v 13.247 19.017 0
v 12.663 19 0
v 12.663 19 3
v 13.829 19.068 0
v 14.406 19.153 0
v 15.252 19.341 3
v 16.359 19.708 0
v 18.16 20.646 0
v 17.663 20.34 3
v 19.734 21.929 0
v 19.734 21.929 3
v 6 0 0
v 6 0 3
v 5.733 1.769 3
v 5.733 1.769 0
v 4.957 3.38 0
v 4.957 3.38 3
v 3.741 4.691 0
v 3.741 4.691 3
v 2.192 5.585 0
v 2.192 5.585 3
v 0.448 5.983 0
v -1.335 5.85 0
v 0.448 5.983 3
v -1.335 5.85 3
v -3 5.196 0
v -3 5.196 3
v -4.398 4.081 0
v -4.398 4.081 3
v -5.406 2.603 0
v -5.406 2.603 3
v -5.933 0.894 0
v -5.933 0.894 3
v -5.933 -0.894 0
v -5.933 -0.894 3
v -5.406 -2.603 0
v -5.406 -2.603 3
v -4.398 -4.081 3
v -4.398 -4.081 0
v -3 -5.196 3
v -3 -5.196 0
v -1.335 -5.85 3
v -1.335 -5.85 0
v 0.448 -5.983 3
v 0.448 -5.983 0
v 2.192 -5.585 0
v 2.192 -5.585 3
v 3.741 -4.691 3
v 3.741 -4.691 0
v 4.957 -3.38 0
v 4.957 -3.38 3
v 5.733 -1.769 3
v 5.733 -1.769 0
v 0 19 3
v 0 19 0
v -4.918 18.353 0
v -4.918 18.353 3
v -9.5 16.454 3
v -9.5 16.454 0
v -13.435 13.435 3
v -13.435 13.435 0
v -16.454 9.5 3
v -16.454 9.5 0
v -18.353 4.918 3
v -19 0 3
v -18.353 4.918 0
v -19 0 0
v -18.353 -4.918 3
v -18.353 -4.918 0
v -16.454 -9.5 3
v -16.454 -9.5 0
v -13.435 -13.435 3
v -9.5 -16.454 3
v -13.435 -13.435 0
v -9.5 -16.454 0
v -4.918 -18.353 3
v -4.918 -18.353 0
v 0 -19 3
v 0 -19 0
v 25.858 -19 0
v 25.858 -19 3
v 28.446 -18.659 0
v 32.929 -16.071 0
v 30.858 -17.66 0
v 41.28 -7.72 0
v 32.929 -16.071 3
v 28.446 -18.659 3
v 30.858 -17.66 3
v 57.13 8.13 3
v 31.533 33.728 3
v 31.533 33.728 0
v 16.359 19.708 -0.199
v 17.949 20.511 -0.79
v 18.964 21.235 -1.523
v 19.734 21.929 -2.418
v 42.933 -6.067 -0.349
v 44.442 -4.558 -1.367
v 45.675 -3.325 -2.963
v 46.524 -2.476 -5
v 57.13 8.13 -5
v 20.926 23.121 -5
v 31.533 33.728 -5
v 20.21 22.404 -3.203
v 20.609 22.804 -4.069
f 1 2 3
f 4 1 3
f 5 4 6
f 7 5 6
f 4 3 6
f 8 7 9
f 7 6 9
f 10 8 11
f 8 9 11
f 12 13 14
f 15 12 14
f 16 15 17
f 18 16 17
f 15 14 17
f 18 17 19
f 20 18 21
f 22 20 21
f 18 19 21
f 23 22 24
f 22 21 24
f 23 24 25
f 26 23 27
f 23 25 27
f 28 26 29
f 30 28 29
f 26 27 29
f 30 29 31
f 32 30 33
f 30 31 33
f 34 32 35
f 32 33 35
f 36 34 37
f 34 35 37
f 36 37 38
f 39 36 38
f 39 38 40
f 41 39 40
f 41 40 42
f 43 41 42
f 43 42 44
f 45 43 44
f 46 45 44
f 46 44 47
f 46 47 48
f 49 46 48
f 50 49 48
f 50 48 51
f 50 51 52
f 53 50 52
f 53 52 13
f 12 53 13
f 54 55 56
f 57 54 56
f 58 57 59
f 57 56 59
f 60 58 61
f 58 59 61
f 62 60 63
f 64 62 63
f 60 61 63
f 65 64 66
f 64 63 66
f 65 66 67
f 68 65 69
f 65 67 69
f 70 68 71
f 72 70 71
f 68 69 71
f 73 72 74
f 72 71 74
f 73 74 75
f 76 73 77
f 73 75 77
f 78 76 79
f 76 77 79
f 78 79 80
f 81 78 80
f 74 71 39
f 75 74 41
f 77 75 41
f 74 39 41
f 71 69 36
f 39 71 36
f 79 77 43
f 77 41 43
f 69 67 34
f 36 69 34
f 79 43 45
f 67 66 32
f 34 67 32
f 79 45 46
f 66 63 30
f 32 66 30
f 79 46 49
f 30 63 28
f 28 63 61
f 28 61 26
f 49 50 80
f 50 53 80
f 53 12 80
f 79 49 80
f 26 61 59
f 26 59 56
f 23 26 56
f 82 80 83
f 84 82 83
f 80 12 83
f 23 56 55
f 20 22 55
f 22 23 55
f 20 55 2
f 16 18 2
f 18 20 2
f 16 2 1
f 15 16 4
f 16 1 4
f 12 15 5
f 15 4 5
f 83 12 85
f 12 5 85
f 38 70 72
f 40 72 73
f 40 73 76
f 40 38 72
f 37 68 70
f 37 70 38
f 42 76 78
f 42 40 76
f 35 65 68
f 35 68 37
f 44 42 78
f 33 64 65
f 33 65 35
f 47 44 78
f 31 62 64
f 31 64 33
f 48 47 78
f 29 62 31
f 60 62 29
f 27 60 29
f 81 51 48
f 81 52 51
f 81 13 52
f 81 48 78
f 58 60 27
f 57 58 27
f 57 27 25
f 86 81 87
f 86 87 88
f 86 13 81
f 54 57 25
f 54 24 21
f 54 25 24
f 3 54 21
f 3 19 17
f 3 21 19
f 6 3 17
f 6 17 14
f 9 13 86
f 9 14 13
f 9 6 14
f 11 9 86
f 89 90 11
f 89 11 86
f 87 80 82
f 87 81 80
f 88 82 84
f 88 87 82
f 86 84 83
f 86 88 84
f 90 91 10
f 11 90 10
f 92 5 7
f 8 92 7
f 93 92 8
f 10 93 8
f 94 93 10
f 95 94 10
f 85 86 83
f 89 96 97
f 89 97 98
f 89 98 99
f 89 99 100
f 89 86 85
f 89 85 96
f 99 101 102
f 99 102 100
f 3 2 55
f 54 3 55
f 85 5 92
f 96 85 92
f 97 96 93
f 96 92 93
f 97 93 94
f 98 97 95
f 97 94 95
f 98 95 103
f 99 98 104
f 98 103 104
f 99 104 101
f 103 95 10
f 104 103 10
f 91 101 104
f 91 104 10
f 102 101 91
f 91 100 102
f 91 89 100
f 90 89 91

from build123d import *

# Parameters (mm, degrees)
SKETCH1_R           = 2.5
BOSS_EXTRUDE1_DEPTH = 3
SKETCH2_R           = 1.5
CUT_EXTRUDE1_DEPTH  = 77.127156728
FILLET1_R           = 10
SKETCH3_R           = 6
CUT_EXTRUDE2_DEPTH  = 77.127156728
BOSS_EXTRUDE3_DEPTH = 5
FILLET3_START       = -3.356502253
FILLET3_DEPTH       = 38.004734531
FILLET3_START_2     = -6
FILLET3_2_DEPTH     = 6


with BuildPart() as part:
    # Sketch1 → Boss-Extrude1 (new body)
    with BuildSketch(Plane.XY):
        with BuildLine():
            Line((0, -19), (30, -19))
            Line((30, -19), (64.201367261, 15.201367261))
            Line((64.201367261, 15.201367261), (58.615223689, 20.787510832))
            Line((58.615223689, 20.787510832), (44.190245353, 35.212489168))
            Line((44.190245353, 35.212489168), (38.604101782, 40.798632739))
            Line((38.604101782, 40.798632739), (16.805469042, 19))
            Line((16.805469042, 19), (0, 19))
            ThreePointArc((0, 19), (-19, 0), (0, -19))
        make_face()
        Circle(SKETCH1_R, mode=Mode.SUBTRACT)
    extrude(amount=BOSS_EXTRUDE1_DEPTH)

    # Sketch2 → Cut-Extrude1 (cut, through all)
    with BuildSketch(Plane.XY.offset(3)):
        with Locations((38.878105659, 35.574881393)):
            Circle(SKETCH2_R)
        with Locations((58.977615915, 15.475371138)):
            Circle(SKETCH2_R)
    extrude(amount=-CUT_EXTRUDE1_DEPTH, mode=Mode.SUBTRACT)

    # Fillet1
    fillet1_edges = [part.edges().sort_by_distance(p)[0] for p in [
        (16.805469042, 19, 1.5),
        (30, -19, 1.5),
    ]]
    fillet(fillet1_edges, radius=FILLET1_R)

    # Sketch3 → Cut-Extrude2 (cut, through all)
    with BuildSketch(Plane.XY.offset(3)):
        Circle(SKETCH3_R)
        Polygon((38.604101782, 40.798632739), (31.53303397, 33.727564928), (57.130299449, 8.130299449), (64.201367261, 15.201367261), align=None)
    extrude(amount=-CUT_EXTRUDE2_DEPTH, mode=Mode.SUBTRACT)

    # Sketch5 → Boss-Extrude3 (add)
    with BuildSketch(Plane(origin=(0, 0, 0), x_dir=(-1, 0, 0), z_dir=(0, 0, -1))):
        Polygon((-57.130299449, 8.130299449), (-31.53303397, 33.727564928), (-20.926432252, 23.12096321), (-46.523697731, -2.476302269), align=None)
    extrude(amount=BOSS_EXTRUDE3_DEPTH)

    # Fillet3: read off the stored shape, not the designer's step
    # Fillet3 outline → Fillet3 (add)
    with BuildSketch(Plane(origin=(0, 0, 0), x_dir=(0.707106781186548, 0.707106781186547, 0), z_dir=(0.707106781186547, -0.707106781186548, 0)).offset(FILLET3_START)):
        with BuildLine():
            ThreePointArc((23.730013537, 0), (28.202149492, -1.366750419), (31.146212025, -5))
            Line((31.146212025, -5), (31.146212025, 0))
            Line((31.146212025, 0), (23.730013537, 0))
        make_face()
    extrude(amount=FILLET3_DEPTH)

    # Fillet3 2 outline → Fillet3 2 (cut)
    with BuildSketch(Plane.XY.offset(FILLET3_START_2)):
        with BuildLine():
            Line((19.650292227, 24.397103235), (14.406247999, 19.153058913))
            ThreePointArc((14.406247999, 19.153058913), (17.283716467, 20.131400309), (19.73440123, 21.928932188))
            Line((19.73440123, 21.928932188), (20.926432252, 23.12096321))
            Line((20.926432252, 23.12096321), (19.650292227, 24.397103235))
        make_face()
    extrude(amount=FILLET3_2_DEPTH, mode=Mode.SUBTRACT)


solid = part.part
